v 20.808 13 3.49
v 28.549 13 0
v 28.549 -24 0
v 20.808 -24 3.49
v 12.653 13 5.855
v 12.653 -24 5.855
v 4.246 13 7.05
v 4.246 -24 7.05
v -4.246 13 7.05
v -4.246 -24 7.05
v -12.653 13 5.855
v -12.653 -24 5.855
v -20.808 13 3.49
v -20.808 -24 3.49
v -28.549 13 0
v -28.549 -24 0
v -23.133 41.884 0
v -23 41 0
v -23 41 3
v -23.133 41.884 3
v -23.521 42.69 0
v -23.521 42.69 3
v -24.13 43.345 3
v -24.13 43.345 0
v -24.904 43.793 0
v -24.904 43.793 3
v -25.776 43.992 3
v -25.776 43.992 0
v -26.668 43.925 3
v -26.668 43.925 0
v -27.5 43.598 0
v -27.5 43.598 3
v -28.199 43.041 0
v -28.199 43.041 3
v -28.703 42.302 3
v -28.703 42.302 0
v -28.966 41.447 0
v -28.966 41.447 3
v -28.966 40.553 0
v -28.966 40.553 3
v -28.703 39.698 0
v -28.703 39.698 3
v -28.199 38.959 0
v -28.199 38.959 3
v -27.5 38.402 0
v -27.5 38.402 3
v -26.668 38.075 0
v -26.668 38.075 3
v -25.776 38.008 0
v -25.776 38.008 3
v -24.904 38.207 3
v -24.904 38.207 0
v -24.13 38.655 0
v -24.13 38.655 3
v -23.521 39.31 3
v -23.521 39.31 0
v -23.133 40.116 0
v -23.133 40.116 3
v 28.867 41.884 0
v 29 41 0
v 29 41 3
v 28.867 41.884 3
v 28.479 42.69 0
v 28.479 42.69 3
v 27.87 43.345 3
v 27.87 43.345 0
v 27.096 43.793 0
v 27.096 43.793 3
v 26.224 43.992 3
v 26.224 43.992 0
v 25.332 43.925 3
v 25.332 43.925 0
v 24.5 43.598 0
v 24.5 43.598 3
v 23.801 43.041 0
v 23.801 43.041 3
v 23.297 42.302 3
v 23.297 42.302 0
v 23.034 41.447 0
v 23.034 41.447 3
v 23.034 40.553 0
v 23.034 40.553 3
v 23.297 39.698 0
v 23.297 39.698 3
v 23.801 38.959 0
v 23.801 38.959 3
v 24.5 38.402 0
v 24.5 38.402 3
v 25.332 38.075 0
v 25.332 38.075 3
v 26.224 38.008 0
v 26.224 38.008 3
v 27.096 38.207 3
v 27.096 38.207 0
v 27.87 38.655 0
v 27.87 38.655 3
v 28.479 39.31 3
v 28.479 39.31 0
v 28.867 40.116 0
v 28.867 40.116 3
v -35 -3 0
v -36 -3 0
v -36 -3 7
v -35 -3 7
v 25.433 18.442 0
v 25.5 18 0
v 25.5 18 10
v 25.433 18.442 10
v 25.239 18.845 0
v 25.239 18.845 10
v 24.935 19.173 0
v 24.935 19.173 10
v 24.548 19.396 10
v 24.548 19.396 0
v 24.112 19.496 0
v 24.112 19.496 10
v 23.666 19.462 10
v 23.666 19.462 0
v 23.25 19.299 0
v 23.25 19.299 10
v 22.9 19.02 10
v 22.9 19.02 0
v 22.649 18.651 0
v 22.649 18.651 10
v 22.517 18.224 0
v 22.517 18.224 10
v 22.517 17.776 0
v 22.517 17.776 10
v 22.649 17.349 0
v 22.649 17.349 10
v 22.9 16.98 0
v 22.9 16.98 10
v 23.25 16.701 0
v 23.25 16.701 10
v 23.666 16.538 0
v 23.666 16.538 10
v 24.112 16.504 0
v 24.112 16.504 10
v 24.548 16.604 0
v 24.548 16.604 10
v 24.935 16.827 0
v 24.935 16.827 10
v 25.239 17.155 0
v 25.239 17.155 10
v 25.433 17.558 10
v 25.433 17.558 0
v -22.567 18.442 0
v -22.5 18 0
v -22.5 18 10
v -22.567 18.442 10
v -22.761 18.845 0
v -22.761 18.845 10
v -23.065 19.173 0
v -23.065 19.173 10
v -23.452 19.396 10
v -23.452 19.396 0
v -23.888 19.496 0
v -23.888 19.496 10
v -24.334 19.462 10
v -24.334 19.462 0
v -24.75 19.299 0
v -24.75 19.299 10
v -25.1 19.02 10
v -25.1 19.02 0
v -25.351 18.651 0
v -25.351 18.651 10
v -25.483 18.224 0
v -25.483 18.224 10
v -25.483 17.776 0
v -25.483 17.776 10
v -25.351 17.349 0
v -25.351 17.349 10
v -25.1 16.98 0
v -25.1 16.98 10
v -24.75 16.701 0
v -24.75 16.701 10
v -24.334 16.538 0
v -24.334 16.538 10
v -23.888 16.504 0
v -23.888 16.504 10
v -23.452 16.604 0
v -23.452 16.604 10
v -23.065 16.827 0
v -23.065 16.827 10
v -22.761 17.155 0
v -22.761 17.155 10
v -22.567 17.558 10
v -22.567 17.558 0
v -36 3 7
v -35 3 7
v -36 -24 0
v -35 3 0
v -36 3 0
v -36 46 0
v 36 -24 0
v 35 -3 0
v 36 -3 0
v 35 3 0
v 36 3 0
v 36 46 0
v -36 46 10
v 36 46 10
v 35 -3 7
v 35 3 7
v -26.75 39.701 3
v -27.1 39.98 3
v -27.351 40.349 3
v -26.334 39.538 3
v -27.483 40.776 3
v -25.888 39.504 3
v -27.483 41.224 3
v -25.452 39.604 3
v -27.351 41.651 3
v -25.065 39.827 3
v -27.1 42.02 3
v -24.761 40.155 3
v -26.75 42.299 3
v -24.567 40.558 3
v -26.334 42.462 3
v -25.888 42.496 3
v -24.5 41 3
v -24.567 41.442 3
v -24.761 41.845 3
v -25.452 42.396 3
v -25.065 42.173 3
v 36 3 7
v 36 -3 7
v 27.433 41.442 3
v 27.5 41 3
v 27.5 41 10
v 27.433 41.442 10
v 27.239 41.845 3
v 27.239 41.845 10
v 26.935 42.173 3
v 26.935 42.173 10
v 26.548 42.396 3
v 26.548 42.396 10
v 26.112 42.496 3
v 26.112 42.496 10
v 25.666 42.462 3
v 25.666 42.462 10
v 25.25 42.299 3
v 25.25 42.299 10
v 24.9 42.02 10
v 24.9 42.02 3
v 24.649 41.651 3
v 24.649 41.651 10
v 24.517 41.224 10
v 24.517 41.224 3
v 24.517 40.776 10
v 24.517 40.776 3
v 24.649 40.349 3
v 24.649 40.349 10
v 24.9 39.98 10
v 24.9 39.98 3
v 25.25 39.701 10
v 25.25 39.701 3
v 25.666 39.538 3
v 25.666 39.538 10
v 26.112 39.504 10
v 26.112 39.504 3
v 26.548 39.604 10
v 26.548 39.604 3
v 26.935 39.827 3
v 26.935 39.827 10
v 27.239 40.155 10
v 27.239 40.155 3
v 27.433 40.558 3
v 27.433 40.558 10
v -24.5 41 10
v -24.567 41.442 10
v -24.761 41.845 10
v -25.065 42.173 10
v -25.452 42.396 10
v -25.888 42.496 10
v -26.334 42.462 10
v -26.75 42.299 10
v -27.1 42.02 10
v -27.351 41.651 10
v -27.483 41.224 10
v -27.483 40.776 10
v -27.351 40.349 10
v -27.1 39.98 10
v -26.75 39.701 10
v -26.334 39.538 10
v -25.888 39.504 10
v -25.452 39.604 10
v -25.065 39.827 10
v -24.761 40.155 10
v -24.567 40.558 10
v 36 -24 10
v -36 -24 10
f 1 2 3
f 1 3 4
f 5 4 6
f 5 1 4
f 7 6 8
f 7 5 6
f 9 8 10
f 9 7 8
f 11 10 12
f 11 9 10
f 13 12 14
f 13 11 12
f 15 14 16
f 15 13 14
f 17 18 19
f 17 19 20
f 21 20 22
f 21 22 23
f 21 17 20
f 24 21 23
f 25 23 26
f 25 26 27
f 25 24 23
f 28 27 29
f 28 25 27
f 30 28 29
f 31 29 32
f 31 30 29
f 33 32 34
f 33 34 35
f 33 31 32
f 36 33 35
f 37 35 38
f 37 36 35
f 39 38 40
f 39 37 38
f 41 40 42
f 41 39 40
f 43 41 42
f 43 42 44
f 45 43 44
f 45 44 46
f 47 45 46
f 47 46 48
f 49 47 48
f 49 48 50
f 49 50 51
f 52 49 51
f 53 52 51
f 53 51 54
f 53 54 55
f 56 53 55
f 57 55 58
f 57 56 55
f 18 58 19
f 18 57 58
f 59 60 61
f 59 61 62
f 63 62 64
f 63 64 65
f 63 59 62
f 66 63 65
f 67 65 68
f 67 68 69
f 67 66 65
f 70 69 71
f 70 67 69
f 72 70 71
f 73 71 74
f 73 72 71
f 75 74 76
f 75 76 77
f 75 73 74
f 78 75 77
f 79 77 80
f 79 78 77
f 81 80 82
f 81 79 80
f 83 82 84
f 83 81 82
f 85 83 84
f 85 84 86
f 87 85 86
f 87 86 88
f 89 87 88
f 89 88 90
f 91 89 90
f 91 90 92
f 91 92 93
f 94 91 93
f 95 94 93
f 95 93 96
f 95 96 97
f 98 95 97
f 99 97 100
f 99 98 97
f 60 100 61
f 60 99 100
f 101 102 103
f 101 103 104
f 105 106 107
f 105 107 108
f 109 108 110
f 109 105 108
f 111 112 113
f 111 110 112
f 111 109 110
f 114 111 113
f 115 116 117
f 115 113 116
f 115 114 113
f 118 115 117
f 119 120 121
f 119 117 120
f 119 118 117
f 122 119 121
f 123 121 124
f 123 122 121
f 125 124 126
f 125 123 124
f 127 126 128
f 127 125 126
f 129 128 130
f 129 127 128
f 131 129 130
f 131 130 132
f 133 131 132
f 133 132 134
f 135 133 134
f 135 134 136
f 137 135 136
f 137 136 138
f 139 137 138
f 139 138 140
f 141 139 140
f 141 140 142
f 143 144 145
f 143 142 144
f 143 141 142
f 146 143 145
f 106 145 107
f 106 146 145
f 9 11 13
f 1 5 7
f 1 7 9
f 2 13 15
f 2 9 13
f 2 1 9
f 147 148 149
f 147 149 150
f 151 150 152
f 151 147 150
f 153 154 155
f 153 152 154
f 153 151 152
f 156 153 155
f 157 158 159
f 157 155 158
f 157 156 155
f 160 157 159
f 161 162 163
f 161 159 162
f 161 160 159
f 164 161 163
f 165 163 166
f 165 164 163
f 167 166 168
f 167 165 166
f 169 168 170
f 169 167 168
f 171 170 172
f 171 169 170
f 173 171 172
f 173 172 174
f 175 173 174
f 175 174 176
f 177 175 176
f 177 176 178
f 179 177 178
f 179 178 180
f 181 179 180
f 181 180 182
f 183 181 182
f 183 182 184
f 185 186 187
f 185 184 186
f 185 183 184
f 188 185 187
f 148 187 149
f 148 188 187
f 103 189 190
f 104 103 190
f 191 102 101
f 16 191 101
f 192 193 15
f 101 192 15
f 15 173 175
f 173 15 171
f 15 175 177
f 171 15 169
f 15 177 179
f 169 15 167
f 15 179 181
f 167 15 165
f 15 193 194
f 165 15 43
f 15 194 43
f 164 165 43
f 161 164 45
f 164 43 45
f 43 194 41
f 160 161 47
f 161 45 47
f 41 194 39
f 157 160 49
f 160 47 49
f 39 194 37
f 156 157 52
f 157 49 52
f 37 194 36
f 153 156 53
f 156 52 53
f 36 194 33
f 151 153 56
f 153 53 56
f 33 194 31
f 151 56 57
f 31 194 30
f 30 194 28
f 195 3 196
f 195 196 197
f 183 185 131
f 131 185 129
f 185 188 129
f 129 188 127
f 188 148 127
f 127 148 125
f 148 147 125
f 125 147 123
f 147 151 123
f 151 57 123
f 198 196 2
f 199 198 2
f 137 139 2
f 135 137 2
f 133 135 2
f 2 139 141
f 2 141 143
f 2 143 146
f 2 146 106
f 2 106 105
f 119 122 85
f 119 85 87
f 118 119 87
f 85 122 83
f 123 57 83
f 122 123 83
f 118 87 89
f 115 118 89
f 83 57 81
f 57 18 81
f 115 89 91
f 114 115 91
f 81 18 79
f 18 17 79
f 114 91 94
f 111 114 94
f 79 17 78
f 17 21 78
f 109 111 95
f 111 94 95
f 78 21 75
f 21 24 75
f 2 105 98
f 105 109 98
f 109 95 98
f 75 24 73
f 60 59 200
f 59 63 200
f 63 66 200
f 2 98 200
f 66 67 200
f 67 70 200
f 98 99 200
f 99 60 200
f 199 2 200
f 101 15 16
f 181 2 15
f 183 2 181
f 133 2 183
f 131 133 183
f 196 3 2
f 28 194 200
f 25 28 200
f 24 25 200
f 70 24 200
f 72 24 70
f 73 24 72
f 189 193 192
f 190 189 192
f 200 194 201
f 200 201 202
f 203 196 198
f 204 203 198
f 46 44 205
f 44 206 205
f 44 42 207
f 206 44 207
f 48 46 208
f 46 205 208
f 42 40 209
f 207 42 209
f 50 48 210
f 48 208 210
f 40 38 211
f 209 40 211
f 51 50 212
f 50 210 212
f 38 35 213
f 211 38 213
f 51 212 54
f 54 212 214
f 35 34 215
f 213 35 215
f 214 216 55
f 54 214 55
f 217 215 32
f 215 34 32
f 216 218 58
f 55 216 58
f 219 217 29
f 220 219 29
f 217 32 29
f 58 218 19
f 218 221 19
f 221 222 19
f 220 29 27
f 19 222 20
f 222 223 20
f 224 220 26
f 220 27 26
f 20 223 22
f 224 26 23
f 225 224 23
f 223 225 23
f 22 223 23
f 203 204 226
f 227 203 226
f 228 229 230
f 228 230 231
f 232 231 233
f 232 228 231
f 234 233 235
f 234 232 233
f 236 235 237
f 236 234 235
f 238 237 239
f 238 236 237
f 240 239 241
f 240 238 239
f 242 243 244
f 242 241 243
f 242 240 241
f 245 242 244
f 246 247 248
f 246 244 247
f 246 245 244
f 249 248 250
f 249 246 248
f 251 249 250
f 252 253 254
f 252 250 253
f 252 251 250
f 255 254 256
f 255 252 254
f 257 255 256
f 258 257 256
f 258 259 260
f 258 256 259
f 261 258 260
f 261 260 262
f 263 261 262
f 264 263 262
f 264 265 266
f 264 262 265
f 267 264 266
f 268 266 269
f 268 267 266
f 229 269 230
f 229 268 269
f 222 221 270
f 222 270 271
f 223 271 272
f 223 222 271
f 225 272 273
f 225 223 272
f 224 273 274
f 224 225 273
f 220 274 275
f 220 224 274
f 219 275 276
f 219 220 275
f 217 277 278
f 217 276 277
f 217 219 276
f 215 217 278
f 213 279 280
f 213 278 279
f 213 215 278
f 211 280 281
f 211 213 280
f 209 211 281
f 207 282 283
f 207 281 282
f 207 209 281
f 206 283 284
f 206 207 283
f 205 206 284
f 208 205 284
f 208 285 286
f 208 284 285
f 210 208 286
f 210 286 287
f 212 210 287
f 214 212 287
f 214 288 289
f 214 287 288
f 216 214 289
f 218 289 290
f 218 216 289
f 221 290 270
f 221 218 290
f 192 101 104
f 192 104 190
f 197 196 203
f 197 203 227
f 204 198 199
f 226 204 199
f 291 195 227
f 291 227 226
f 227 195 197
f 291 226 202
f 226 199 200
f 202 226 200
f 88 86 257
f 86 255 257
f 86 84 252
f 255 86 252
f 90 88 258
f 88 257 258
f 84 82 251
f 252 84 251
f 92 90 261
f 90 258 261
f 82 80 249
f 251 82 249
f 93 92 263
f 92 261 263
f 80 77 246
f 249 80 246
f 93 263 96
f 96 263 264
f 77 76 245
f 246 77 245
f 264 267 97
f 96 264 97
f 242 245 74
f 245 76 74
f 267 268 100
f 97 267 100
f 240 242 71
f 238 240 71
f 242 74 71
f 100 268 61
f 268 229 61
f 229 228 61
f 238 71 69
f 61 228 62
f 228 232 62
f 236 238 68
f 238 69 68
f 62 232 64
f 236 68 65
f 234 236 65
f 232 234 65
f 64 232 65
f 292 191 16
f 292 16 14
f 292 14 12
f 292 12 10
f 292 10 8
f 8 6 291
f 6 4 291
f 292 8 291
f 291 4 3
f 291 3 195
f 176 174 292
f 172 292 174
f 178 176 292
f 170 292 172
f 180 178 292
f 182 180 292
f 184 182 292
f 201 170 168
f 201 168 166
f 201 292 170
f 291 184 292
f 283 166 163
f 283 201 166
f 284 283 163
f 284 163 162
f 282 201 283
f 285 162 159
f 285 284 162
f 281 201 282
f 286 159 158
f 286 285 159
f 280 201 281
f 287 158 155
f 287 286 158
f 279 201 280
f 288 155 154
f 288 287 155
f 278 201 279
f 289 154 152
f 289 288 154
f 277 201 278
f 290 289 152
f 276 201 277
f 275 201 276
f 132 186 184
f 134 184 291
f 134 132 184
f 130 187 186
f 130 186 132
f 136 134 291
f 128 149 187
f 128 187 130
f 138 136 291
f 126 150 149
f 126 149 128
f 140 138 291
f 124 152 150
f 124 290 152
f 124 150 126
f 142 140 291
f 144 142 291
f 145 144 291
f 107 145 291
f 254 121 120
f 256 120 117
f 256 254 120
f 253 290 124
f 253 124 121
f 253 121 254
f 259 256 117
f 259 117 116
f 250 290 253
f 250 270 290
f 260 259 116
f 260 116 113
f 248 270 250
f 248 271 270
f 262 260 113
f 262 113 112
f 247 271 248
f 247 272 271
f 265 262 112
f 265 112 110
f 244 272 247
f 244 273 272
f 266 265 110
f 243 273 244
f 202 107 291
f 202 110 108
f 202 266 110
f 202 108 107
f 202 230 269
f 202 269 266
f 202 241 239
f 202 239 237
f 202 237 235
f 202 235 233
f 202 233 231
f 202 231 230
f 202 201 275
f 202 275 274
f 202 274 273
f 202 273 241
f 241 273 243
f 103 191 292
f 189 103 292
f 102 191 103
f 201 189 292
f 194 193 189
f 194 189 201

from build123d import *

# Parameters (mm, degrees)
BOX241_W           = 6
BOX241_H           = 6
BOX241_DEPTH       = 64
BOX240_W           = 6
BOX240_H           = 6
BOX240_DEPTH       = 64
CYLINDER_R         = 60.2
CYLINDER_DEPTH     = 52
CYLINDER1233_R     = 1.5
CYLINDER1233_DEPTH = 32
CYLINDER1232_R     = 1.5
CYLINDER1232_DEPTH = 32
CYLINDER1239_R     = 1.5
CYLINDER1239_DEPTH = 100
CYLINDER1238_R     = 1.5
CYLINDER1238_DEPTH = 100
CYLINDER1245_R     = 3
CYLINDER1245_DEPTH = 3
CYLINDER1244_R     = 3
CYLINDER1244_DEPTH = 3
CYLINDER544_R      = 1.5
CYLINDER544_DEPTH  = 50
CYLINDER550_R      = 1.5
CYLINDER550_DEPTH  = 50
CYLINDER556_R      = 1.5
CYLINDER556_DEPTH  = 50
CYLINDER549_R      = 1.5
CYLINDER549_DEPTH  = 50
CYLINDER535_R      = 1.5
CYLINDER535_DEPTH  = 100
CYLINDER538_R      = 1.5
CYLINDER538_DEPTH  = 100
CYLINDER583_R      = 1.5
CYLINDER583_DEPTH  = 100
CYLINDER584_R      = 1.5
CYLINDER584_DEPTH  = 100
BOX142_W           = 72
BOX142_H           = 70
BOX142_DEPTH       = 10


with BuildPart() as krychle241:
    # Box241 → Box241 (new body)
    with BuildSketch(Plane(origin=(87, -3, -93), x_dir=(1, 0, 0), z_dir=(0, 0, 1))):
        with Locations((3, 3)):
            Rectangle(BOX241_W, BOX241_H)
    extrude(amount=BOX241_DEPTH)


with BuildPart() as compound653:
    # Box240 → Box240 (new body)
    with BuildSketch(Plane(origin=(11, -3, -93), x_dir=(1, 0, 0), z_dir=(0, 0, 1))):
        with Locations((3, 3)):
            Rectangle(BOX240_W, BOX240_H)
    extrude(amount=BOX240_DEPTH)

    # Compound653: union Krychle241
    add(krychle241.part)


with BuildPart() as compound653_1:
    # Compound653 placement: moved
    add(compound653.part.moved(Location((-52, 0, 36))))


with BuildPart() as v_lec:
    # Cylinder → Cylinder (new body)
    with BuildSketch(Plane(origin=(0, 13, -53), x_dir=(1, 0, 0), z_dir=(0, -1, 0))):
        Circle(CYLINDER_R)
    extrude(amount=CYLINDER_DEPTH)


with BuildPart() as v_lec1233:
    # Cylinder1233 → Cylinder1233 (new body)
    with BuildSketch(Plane(origin=(78, 41, -42), x_dir=(1, 0, 0), z_dir=(0, 0, 1))):
        Circle(CYLINDER1233_R)
    extrude(amount=CYLINDER1233_DEPTH)


with BuildPart() as compound620:
    # Cylinder1232 → Cylinder1232 (new body)
    with BuildSketch(Plane(origin=(26, 41, -42), x_dir=(1, 0, 0), z_dir=(0, 0, 1))):
        Circle(CYLINDER1232_R)
    extrude(amount=CYLINDER1232_DEPTH)

    # Compound620: union Válec1233
    add(v_lec1233.part)


with BuildPart() as compound620_1:
    # Compound620 placement: moved
    add(compound620.part.moved(Location((-52, 0, 36))))


with BuildPart() as v_lec1239:
    # Cylinder1239 → Cylinder1239 (new body)
    with BuildSketch(Plane(origin=(14, 0, -60), x_dir=(1, 0, 0), z_dir=(0, 0, 1))):
        Circle(CYLINDER1239_R)
    extrude(amount=CYLINDER1239_DEPTH)


with BuildPart() as compound630:
    # Cylinder1238 → Cylinder1238 (new body)
    with BuildSketch(Plane(origin=(90, 0, -60), x_dir=(1, 0, 0), z_dir=(0, 0, 1))):
        Circle(CYLINDER1238_R)
    extrude(amount=CYLINDER1238_DEPTH)

    # Compound625: union Válec1239
    add(v_lec1239.part)


with BuildPart() as compound630_1:
    # Compound625 placement: moved
    add(compound630.part.moved(Location((-52, 0, 0))))

    # Compound630: union Compound620
    add(compound620_1.part)


with BuildPart() as v_lec1245:
    # Cylinder1245 → Cylinder1245 (new body)
    with BuildSketch(Plane(origin=(78, 41, -42), x_dir=(1, 0, 0), z_dir=(0, 0, 1))):
        Circle(CYLINDER1245_R)
    extrude(amount=CYLINDER1245_DEPTH)


with BuildPart() as compound634:
    # Cylinder1244 → Cylinder1244 (new body)
    with BuildSketch(Plane(origin=(26, 41, -42), x_dir=(1, 0, 0), z_dir=(0, 0, 1))):
        Circle(CYLINDER1244_R)
    extrude(amount=CYLINDER1244_DEPTH)

    # Compound634: union Válec1245
    add(v_lec1245.part)


with BuildPart() as compound634_1:
    # Compound634 placement: moved
    add(compound634.part.moved(Location((-52, 0, 42))))


with BuildPart() as v_lec544:
    # Cylinder544 → Cylinder544 (new body)
    with BuildSketch(Plane(origin=(-51, 6, 0), x_dir=(1, 0, 0), z_dir=(0, 0, 1))):
        Circle(CYLINDER544_R)
    extrude(amount=CYLINDER544_DEPTH)


with BuildPart() as v_lec550:
    # Cylinder550 → Cylinder550 (new body)
    with BuildSketch(Plane(origin=(-24, 18, 0), x_dir=(1, 0, 0), z_dir=(0, 0, 1))):
        Circle(CYLINDER550_R)
    extrude(amount=CYLINDER550_DEPTH)


with BuildPart() as v_lec556:
    # Cylinder556 → Cylinder556 (new body)
    with BuildSketch(Plane(origin=(24, 18, 0), x_dir=(1, 0, 0), z_dir=(0, 0, 1))):
        Circle(CYLINDER556_R)
    extrude(amount=CYLINDER556_DEPTH)


with BuildPart() as compound324:
    # Cylinder549 → Cylinder549 (new body)
    with BuildSketch(Plane(origin=(51, 6, 0), x_dir=(1, 0, 0), z_dir=(0, 0, 1))):
        Circle(CYLINDER549_R)
    extrude(amount=CYLINDER549_DEPTH)

    # Compound324: union Válec544, Válec550, Válec556
    add(v_lec544.part)
    add(v_lec550.part)
    add(v_lec556.part)


with BuildPart() as v_lec535:
    # Cylinder535 → Cylinder535 (new body)
    with BuildSketch(Plane(origin=(51, -12, 0), x_dir=(1, 0, 0), z_dir=(0, 0, 1))):
        Circle(CYLINDER535_R)
    extrude(amount=CYLINDER535_DEPTH)


with BuildPart() as compound323:
    # Cylinder538 → Cylinder538 (new body)
    with BuildSketch(Plane(origin=(-51, -12, 0), x_dir=(1, 0, 0), z_dir=(0, 0, 1))):
        Circle(CYLINDER538_R)
    extrude(amount=CYLINDER538_DEPTH)

    # Compound323: union Válec535
    add(v_lec535.part)


with BuildPart() as v_lec583:
    # Cylinder583 → Cylinder583 (new body)
    with BuildSketch(Plane(origin=(39, -21, 0), x_dir=(1, 0, 0), z_dir=(0, 0, 1))):
        Circle(CYLINDER583_R)
    extrude(amount=CYLINDER583_DEPTH)


with BuildPart() as compound628:
    # Cylinder584 → Cylinder584 (new body)
    with BuildSketch(Plane(origin=(-39, -21, 0), x_dir=(1, 0, 0), z_dir=(0, 0, 1))):
        Circle(CYLINDER584_R)
    extrude(amount=CYLINDER584_DEPTH)

    # Compound339: union Válec583
    add(v_lec583.part)

    # Compound628: union Compound324, Compound323
    add(compound324.part)
    add(compound323.part)


with BuildPart() as compound628_1:
    # Compound628 placement: moved
    add(compound628.part.moved(Location((0, 0, -10))))


with BuildPart() as cut209:
    # Box142 → Box142 (new body)
    with BuildSketch(Plane(origin=(-36, -24, 0), x_dir=(1, 0, 0), z_dir=(0, 0, 1))):
        with Locations((36, 35)):
            Rectangle(BOX142_W, BOX142_H)
    extrude(amount=BOX142_DEPTH)

    # Cut201: cut Compound628
    add(compound628_1.part, mode=Mode.SUBTRACT)

    # Cut202: cut Compound634
    add(compound634_1.part, mode=Mode.SUBTRACT)

    # Cut203: cut Compound630
    add(compound630_1.part, mode=Mode.SUBTRACT)

    # Cut208: cut Válec
    add(v_lec.part, mode=Mode.SUBTRACT)

    # Cut209: cut Compound653
    add(compound653_1.part, mode=Mode.SUBTRACT)


solid = cut209.part
